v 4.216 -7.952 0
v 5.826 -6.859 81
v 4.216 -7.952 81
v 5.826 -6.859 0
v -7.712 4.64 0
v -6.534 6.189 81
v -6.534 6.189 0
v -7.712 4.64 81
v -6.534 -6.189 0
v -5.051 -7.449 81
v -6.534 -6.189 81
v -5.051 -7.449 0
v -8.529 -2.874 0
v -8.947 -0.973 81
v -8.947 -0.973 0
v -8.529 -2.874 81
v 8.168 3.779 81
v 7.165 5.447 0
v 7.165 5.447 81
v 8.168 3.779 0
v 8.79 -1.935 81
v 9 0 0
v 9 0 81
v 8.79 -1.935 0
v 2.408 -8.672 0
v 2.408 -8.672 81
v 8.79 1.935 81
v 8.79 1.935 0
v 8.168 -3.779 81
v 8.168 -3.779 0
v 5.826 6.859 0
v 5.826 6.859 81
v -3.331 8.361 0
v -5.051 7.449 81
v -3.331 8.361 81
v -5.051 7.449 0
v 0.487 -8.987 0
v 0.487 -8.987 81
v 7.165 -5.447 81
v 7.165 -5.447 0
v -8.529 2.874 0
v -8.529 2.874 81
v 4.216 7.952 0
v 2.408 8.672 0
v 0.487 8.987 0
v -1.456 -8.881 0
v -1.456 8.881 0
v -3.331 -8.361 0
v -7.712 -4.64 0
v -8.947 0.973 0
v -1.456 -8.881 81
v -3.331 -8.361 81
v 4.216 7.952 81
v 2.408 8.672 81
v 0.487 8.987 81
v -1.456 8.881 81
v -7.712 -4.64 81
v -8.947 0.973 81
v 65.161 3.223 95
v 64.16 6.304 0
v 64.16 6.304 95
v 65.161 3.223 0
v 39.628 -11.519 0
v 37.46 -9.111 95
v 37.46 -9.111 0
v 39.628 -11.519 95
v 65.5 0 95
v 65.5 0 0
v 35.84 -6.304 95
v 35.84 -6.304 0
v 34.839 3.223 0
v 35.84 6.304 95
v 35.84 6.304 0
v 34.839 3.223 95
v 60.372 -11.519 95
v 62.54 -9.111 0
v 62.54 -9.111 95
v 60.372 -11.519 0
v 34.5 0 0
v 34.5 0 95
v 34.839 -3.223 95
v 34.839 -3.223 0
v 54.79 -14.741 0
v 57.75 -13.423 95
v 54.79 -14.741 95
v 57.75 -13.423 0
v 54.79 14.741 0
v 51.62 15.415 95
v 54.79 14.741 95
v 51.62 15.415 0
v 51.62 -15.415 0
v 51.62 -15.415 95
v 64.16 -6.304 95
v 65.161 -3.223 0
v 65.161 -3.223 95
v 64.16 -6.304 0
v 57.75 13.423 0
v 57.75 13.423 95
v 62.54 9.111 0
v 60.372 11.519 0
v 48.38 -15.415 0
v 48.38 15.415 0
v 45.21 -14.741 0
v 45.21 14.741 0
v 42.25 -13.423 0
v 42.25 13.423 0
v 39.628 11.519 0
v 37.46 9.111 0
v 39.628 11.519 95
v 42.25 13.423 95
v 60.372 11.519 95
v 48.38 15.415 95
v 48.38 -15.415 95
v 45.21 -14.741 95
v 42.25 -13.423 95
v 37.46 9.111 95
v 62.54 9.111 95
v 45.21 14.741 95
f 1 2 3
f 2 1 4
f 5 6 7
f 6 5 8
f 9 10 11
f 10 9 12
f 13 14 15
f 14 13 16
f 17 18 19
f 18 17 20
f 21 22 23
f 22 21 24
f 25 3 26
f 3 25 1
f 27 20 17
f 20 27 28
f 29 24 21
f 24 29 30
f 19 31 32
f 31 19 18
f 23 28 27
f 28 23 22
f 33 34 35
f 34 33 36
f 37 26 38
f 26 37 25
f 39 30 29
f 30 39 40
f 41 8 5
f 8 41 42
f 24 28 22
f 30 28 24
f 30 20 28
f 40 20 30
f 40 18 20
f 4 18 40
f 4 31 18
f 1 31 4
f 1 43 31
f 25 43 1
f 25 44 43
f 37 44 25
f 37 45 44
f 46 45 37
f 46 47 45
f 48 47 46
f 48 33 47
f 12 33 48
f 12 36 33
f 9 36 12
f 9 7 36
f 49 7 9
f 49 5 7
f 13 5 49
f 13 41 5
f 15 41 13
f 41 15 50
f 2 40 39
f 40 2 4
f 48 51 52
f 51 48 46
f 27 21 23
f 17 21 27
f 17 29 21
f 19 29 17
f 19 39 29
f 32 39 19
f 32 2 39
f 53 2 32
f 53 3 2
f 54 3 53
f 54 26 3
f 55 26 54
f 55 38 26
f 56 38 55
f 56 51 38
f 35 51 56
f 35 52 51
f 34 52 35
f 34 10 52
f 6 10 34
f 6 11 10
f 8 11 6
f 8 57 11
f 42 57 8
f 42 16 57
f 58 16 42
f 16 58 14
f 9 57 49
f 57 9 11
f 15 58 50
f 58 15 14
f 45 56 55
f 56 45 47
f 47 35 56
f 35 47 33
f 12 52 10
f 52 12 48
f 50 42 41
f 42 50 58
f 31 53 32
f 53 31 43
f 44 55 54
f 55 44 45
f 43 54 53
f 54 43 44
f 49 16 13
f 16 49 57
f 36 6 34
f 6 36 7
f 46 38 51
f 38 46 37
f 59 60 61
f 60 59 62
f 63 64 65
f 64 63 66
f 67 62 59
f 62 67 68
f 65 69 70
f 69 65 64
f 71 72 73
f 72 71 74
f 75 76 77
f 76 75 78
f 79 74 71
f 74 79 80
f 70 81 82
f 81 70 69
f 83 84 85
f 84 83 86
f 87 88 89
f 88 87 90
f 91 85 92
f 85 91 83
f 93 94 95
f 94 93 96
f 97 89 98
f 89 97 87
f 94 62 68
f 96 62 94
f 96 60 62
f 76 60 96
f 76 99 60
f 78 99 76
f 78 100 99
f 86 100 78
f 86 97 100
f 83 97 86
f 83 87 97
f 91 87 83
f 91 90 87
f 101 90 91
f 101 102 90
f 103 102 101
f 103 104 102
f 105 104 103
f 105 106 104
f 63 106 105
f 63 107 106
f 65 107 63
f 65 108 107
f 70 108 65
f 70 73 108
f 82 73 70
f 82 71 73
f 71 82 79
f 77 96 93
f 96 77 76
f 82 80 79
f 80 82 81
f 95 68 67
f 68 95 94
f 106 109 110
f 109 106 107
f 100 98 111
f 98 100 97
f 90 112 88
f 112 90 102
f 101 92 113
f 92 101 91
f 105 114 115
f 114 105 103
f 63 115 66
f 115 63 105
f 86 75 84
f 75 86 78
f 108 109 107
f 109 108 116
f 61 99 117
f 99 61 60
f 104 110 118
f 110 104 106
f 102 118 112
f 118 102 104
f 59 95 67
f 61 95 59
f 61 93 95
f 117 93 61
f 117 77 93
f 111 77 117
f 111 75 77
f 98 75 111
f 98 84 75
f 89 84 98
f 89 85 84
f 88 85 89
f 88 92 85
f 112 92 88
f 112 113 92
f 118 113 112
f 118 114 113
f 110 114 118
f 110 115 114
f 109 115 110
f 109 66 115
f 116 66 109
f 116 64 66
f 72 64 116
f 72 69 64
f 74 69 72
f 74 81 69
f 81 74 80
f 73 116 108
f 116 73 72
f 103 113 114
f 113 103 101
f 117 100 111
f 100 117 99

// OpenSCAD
linear_extrude(81) circle(9);

translate ([50,0,0])
linear_extrude(95) circle(15.5);
